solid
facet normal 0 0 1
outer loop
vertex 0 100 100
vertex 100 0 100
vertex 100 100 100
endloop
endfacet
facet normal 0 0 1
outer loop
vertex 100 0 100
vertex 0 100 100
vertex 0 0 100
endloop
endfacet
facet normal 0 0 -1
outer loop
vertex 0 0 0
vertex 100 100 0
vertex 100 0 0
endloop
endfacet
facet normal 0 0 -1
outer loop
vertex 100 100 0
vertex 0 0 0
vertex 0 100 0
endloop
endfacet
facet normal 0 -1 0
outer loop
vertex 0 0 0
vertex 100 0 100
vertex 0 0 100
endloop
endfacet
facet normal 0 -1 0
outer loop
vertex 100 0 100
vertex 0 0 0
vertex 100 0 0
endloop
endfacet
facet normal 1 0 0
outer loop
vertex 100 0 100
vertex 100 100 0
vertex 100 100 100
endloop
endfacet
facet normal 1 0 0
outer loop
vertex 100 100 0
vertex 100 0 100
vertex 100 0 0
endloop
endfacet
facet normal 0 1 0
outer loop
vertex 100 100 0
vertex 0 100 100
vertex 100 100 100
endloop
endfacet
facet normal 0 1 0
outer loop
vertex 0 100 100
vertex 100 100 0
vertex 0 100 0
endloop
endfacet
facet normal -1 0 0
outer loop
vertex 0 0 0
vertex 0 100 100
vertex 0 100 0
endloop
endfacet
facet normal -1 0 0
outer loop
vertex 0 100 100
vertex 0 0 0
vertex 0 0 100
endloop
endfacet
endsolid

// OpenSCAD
scale(10) {
    cube(10);
    polygon(
        points=[[0,0], [0,2], [1,1], [2,0], [2,2]],
        paths=[[0,1,2,3,4,2]]);
}
